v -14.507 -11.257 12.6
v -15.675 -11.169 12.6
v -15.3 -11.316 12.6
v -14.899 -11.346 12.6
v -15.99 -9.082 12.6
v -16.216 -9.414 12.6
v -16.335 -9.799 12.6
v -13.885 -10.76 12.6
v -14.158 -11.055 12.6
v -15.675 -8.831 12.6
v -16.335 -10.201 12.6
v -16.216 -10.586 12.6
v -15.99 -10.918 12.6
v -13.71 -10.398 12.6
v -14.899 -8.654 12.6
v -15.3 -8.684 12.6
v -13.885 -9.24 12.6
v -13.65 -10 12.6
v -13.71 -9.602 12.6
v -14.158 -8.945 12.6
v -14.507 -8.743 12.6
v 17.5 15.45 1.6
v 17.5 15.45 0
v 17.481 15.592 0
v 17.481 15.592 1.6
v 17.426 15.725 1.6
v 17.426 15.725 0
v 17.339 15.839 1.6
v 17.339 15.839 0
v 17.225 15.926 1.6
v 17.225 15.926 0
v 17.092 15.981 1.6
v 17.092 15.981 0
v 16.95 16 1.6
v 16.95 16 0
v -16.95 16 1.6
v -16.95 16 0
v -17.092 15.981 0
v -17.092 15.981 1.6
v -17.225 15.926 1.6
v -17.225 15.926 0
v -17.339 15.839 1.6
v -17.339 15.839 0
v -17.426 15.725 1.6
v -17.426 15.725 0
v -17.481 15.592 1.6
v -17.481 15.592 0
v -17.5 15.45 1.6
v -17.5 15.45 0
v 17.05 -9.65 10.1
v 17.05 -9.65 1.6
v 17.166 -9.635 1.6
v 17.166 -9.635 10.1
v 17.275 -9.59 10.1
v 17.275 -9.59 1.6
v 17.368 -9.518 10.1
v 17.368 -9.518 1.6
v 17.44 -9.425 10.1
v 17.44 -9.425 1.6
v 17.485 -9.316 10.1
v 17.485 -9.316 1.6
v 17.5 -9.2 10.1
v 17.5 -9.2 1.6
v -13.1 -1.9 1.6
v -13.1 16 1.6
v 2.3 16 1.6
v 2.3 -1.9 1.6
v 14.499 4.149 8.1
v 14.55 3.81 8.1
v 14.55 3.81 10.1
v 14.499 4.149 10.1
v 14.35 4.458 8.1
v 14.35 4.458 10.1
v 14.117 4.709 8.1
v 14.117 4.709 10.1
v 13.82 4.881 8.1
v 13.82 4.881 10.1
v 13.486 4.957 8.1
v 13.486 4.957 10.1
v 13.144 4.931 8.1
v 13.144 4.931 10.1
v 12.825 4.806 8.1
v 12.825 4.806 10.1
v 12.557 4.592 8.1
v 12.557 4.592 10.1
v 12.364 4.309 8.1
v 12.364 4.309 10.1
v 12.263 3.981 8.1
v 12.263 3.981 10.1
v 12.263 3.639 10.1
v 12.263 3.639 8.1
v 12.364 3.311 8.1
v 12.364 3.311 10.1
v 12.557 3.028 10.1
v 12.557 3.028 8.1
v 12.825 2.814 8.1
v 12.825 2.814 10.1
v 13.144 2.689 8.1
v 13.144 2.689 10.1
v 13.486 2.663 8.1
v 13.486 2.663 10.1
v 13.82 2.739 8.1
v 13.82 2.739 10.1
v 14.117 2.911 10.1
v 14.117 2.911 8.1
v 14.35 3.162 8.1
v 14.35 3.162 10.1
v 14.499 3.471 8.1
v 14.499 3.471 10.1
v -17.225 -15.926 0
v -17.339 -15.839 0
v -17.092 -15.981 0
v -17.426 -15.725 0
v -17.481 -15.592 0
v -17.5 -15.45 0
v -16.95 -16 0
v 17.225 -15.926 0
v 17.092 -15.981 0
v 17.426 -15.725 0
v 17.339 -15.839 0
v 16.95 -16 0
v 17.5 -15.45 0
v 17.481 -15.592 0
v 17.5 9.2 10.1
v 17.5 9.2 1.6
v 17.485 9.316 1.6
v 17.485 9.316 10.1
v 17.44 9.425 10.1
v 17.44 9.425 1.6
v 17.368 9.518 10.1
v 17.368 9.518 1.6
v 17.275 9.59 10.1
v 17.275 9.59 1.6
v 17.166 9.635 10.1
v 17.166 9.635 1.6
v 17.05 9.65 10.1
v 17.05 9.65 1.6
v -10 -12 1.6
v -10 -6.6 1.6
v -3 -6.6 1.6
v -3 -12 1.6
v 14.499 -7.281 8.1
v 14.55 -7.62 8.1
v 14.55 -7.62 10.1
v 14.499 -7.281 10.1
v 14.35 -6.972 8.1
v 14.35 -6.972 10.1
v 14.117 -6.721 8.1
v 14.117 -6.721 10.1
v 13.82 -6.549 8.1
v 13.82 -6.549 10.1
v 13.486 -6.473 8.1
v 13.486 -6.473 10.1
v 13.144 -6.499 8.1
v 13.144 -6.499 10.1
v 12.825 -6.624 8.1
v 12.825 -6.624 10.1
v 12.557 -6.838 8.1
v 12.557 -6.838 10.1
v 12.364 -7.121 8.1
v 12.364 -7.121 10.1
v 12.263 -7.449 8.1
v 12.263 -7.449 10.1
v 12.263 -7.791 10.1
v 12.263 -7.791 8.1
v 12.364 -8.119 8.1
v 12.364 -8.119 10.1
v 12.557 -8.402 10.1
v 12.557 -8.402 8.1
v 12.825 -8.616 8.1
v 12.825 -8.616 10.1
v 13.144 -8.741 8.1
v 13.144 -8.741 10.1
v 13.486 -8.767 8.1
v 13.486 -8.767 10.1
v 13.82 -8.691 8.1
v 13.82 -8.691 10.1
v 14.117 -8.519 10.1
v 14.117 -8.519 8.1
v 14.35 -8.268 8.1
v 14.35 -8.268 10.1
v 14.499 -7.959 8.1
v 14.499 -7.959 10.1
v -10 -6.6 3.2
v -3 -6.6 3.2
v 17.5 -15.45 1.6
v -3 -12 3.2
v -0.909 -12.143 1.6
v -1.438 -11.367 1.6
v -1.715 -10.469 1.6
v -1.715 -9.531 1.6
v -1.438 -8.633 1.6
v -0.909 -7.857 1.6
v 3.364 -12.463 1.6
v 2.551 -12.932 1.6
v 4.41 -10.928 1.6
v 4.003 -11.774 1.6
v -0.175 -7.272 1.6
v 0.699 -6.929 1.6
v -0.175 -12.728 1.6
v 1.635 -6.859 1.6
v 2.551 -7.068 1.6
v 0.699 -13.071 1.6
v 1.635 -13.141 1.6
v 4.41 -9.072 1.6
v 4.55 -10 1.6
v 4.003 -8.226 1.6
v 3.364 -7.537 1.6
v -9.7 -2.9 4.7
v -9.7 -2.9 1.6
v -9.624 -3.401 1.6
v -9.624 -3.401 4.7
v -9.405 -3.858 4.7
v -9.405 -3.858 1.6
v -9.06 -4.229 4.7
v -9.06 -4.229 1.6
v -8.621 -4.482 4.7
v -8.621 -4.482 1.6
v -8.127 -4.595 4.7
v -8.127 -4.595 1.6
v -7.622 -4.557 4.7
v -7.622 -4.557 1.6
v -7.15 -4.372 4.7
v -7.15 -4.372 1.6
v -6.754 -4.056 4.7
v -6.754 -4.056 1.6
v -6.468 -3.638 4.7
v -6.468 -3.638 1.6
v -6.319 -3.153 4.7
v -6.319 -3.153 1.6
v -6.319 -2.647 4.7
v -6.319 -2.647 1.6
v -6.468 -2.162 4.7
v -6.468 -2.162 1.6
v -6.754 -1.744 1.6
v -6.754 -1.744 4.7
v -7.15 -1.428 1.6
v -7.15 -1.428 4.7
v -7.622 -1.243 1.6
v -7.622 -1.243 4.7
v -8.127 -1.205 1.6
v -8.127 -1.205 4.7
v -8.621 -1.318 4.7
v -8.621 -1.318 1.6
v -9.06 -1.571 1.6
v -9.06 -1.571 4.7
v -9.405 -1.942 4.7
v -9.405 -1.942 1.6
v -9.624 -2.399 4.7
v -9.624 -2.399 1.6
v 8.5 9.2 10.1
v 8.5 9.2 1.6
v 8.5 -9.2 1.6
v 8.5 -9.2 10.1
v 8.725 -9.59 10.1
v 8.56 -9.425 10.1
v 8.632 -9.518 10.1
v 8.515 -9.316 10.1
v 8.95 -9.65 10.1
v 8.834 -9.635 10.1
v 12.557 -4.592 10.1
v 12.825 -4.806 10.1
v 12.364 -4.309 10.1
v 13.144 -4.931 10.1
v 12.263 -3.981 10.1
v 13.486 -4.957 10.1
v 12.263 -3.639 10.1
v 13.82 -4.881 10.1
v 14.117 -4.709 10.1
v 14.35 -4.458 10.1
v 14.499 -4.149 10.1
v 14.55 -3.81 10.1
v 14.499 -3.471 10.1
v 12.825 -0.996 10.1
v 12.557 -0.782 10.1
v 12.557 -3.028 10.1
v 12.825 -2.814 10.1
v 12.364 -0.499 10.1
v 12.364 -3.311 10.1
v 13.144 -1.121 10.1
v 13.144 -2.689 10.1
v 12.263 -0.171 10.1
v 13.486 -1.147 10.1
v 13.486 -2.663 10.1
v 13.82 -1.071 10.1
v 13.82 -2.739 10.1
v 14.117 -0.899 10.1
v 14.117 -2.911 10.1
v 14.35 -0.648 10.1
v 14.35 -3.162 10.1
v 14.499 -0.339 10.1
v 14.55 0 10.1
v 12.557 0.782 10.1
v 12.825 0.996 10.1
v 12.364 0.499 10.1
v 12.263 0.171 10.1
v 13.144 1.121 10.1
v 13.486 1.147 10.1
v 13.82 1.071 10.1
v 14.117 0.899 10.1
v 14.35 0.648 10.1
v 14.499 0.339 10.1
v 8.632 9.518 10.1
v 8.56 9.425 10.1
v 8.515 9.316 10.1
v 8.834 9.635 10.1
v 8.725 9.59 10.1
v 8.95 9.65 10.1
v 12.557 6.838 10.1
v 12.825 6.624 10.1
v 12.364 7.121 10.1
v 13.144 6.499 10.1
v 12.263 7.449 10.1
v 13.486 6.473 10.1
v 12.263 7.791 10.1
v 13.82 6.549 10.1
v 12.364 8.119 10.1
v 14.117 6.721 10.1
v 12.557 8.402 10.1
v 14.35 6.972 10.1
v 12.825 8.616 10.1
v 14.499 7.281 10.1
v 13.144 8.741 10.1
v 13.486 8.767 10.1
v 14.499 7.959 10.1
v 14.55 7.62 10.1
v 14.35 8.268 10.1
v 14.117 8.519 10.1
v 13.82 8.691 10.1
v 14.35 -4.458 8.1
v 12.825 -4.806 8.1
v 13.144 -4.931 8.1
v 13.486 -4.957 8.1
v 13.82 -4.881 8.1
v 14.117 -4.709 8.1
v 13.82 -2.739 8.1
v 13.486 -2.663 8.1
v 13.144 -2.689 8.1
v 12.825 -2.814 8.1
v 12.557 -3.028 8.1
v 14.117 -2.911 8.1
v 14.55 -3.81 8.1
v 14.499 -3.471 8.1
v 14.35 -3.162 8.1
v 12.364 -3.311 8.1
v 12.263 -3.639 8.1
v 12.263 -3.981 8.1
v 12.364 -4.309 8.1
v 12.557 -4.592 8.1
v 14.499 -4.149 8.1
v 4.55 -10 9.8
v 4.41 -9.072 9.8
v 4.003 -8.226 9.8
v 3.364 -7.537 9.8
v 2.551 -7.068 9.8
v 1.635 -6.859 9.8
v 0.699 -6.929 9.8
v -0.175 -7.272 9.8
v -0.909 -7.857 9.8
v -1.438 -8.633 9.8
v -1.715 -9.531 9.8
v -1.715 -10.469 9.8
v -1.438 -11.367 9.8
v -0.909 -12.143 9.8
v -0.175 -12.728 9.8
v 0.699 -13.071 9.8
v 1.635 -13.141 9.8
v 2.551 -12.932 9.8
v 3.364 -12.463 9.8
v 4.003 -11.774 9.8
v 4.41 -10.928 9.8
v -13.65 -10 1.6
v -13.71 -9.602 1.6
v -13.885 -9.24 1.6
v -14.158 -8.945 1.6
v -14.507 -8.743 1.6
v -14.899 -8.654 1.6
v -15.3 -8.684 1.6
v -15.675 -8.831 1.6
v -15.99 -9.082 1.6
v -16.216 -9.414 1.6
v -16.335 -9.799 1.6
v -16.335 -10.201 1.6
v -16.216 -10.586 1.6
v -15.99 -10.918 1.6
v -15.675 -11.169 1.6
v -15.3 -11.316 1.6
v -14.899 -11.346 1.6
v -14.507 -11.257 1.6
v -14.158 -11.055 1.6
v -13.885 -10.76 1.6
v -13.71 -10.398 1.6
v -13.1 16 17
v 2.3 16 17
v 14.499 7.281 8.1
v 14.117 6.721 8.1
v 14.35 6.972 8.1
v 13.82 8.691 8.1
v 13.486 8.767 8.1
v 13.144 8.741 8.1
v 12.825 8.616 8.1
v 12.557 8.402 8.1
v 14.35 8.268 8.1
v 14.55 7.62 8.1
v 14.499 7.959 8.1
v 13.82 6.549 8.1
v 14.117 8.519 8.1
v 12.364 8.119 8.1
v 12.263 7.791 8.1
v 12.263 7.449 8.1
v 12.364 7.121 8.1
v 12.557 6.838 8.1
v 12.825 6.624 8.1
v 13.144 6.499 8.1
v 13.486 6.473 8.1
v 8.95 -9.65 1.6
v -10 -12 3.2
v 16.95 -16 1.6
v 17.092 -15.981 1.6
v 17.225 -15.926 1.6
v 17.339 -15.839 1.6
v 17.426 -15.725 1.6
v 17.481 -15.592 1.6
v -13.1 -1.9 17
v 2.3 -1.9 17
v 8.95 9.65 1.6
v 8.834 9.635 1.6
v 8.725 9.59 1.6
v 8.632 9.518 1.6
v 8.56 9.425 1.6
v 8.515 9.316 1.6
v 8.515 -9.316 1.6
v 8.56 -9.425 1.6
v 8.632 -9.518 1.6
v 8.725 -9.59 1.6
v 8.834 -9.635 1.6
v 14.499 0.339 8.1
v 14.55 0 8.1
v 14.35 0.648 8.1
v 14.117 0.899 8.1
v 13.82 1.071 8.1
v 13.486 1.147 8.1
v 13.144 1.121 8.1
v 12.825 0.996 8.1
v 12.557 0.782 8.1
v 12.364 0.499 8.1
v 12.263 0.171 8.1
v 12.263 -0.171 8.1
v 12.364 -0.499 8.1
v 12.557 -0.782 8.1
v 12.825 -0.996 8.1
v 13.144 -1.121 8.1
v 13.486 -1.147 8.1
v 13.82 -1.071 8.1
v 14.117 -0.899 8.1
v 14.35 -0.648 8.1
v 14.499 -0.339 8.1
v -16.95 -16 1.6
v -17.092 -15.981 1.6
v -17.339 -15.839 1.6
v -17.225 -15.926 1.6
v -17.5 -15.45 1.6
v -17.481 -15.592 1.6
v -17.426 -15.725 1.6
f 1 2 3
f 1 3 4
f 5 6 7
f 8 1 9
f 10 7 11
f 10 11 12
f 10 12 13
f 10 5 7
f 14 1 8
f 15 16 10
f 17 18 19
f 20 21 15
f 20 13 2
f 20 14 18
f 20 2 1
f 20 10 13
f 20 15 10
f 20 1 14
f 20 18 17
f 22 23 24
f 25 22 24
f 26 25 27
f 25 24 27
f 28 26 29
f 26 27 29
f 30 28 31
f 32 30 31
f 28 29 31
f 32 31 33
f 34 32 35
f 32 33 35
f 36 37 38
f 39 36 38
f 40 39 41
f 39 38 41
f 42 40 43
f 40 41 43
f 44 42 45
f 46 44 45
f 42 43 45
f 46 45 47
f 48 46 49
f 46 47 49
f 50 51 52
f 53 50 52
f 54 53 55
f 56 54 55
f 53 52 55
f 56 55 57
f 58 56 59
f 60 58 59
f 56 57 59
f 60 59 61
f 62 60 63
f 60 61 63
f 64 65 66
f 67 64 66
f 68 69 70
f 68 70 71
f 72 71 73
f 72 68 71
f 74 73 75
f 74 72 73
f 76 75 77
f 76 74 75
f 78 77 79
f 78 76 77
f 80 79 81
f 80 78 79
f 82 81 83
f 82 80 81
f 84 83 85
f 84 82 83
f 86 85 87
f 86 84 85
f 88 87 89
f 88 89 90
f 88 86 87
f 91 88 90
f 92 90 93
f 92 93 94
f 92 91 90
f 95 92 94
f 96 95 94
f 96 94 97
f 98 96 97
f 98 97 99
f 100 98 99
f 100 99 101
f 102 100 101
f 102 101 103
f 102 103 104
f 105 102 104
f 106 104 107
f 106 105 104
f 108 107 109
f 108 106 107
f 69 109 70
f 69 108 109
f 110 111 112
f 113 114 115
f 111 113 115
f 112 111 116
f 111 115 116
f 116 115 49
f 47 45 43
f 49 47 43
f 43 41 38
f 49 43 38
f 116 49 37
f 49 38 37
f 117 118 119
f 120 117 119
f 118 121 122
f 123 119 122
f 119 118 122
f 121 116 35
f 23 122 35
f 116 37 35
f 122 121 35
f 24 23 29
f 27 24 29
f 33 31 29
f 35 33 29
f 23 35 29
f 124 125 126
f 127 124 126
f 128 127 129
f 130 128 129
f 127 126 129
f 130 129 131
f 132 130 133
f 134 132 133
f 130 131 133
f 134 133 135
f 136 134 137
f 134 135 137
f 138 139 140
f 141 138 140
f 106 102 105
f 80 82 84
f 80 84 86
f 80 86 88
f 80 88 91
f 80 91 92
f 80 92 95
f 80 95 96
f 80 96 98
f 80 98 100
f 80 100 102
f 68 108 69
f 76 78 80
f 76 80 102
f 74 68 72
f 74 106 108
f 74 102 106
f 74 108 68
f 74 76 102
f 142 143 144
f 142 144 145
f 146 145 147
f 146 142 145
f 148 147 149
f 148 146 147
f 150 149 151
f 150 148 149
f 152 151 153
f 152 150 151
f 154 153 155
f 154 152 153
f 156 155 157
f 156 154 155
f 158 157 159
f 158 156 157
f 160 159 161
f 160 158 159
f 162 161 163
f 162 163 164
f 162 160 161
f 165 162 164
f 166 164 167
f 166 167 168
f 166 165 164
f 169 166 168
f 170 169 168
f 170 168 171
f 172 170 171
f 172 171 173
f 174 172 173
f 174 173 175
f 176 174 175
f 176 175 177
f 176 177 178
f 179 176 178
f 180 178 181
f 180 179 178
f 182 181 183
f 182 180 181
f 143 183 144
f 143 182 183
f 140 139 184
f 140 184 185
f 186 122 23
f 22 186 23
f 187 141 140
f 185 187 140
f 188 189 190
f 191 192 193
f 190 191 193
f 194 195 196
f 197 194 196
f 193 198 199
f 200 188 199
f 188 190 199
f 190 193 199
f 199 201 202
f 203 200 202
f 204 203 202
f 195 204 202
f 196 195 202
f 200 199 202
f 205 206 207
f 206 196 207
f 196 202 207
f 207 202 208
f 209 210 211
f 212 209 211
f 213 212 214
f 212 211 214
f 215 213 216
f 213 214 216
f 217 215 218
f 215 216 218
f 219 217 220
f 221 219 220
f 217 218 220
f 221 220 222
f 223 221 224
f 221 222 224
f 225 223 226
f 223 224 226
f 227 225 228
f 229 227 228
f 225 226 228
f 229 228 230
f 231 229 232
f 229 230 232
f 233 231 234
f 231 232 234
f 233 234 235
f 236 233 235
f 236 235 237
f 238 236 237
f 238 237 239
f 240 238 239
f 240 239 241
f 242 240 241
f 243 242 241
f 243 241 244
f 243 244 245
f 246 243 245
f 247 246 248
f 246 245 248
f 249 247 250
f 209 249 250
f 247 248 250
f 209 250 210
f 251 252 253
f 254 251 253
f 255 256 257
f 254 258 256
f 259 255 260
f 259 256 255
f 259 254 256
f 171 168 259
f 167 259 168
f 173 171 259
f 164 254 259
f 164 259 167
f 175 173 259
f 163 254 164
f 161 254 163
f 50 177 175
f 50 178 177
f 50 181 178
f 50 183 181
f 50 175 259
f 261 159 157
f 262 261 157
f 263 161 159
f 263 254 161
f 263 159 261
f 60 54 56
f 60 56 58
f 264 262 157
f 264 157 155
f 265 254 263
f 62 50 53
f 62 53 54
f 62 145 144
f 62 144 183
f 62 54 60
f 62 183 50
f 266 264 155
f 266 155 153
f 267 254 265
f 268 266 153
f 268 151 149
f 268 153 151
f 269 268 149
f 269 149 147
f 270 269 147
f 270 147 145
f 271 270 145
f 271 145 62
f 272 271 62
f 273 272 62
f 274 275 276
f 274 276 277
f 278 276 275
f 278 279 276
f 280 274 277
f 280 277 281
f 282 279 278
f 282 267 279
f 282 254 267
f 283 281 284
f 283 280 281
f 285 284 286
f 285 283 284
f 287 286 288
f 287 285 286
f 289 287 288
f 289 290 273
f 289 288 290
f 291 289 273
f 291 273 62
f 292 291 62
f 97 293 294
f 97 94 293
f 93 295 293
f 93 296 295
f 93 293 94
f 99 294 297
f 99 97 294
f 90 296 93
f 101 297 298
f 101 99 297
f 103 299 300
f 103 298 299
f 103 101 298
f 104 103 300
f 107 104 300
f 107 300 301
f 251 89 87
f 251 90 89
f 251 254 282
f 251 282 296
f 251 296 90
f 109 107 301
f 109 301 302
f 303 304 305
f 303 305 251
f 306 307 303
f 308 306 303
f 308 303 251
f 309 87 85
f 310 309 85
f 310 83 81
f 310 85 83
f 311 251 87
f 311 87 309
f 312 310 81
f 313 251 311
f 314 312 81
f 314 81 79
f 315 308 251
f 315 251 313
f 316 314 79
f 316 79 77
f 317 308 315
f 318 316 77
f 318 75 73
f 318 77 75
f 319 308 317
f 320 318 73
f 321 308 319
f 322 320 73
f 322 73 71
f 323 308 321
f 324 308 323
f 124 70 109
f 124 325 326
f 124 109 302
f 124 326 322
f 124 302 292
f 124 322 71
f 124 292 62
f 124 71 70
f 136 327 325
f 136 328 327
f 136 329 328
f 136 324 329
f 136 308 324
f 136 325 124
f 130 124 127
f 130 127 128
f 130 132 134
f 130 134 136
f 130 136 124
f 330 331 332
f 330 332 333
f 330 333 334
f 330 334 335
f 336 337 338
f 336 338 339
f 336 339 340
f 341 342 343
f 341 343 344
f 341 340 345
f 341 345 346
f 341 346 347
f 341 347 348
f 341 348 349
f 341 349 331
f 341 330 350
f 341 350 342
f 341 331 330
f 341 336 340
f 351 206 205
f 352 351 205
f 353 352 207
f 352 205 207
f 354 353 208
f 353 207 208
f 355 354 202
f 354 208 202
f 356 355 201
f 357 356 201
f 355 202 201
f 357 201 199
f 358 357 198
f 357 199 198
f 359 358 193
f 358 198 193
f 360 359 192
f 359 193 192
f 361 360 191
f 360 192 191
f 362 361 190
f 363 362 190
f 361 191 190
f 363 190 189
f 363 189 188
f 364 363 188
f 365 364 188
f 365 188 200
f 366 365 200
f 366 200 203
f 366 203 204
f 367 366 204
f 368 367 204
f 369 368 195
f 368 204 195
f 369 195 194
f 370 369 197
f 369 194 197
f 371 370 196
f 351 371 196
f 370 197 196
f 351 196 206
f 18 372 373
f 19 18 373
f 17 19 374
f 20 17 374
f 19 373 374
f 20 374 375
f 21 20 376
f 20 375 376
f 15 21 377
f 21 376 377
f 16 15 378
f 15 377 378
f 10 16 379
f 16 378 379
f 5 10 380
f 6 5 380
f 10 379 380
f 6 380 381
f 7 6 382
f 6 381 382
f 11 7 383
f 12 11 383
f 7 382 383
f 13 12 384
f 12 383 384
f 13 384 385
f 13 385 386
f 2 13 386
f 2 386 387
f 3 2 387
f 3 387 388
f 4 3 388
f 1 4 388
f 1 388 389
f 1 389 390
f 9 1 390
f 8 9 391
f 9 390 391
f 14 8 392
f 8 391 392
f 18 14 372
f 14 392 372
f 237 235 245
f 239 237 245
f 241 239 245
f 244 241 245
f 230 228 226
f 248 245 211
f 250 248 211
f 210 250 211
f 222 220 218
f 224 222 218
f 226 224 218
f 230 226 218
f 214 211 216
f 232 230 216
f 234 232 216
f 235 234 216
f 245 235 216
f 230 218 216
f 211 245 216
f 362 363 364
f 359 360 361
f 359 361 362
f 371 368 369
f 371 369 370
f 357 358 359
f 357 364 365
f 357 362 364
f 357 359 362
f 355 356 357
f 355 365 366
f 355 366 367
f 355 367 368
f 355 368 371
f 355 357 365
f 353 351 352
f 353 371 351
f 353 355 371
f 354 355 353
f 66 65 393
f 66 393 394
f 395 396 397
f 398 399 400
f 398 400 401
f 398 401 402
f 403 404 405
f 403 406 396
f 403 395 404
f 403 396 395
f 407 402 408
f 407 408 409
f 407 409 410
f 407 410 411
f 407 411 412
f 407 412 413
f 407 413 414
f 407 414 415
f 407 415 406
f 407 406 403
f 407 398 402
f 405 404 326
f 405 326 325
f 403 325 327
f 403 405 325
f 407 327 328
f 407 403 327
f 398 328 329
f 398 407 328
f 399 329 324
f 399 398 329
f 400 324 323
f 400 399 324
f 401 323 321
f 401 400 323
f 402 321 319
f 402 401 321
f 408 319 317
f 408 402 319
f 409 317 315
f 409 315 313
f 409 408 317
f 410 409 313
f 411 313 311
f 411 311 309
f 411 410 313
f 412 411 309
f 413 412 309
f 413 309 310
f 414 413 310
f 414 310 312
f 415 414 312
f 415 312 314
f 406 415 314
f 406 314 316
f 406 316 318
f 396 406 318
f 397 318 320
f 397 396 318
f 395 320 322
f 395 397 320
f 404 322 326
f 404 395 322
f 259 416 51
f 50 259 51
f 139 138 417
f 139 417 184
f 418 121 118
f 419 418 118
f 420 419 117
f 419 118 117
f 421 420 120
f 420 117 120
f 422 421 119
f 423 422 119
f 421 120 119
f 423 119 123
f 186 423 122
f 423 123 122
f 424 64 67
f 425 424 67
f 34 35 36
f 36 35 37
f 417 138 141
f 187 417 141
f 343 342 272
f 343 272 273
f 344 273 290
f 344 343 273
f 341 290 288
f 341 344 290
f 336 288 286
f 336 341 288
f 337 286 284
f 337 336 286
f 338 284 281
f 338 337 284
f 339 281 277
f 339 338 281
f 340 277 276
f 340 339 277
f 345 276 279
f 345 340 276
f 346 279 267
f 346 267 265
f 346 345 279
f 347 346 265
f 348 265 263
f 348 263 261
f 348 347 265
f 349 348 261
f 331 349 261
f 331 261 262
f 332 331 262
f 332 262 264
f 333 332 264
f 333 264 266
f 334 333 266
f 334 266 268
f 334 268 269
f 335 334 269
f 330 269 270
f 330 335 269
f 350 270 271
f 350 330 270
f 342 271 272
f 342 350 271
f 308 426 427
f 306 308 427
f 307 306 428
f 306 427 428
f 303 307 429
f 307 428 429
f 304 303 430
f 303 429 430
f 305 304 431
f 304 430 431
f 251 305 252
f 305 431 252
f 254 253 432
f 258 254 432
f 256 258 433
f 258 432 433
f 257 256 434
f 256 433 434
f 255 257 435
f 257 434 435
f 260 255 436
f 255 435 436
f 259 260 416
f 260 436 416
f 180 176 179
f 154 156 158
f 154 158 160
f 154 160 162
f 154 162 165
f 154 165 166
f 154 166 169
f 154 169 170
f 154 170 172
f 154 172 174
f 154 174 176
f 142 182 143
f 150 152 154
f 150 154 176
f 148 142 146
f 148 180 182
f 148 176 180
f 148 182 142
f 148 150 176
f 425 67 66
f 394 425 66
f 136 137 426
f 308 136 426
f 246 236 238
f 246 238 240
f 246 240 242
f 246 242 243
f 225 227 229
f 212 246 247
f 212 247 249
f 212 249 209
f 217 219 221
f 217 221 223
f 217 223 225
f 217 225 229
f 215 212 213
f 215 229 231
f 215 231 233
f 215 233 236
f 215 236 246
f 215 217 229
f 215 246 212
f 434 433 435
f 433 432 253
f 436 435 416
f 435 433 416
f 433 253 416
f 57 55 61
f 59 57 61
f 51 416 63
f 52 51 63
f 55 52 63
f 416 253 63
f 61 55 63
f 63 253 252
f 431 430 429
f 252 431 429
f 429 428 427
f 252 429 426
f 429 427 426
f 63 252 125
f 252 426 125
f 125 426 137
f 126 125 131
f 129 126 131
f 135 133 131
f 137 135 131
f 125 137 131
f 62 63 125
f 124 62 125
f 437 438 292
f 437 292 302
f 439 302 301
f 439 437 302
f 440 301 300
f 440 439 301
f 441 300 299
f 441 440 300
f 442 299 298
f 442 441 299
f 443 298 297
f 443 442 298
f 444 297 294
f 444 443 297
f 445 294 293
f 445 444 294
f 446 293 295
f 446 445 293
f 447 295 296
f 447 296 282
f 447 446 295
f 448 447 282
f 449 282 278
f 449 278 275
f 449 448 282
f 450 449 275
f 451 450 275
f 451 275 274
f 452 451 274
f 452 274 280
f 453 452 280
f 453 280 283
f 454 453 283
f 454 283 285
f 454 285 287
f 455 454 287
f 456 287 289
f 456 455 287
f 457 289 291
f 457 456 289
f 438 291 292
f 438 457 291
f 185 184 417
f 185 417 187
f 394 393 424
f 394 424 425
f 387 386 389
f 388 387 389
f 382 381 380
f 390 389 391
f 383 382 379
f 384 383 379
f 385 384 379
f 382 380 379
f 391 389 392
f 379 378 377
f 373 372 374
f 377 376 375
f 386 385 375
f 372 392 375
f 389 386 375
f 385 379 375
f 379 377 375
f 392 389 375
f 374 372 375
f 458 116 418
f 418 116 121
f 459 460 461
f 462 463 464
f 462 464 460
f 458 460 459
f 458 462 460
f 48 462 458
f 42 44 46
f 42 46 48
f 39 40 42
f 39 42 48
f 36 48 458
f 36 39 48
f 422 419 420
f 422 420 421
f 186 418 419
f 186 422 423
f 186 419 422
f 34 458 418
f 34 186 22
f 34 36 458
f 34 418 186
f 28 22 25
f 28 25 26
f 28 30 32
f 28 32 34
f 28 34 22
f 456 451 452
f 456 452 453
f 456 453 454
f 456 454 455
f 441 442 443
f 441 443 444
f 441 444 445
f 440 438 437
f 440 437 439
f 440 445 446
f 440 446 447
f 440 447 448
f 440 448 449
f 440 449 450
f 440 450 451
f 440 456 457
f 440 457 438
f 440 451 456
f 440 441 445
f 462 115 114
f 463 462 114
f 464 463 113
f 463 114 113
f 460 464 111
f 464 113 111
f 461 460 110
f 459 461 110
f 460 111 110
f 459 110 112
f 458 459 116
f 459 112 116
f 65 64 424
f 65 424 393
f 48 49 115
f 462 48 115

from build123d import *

# Parameters (mm, degrees)
PCB_35X32_DEPTH                   = 1.6
RELAY_24V_START                   = 1.6
RELAY_24V_SKETCH_W                = 15.4
RELAY_24V_SKETCH_H                = 17.9
RELAY_24V_DEPTH                   = 15.4
FIVE_POSITION_3P81_TERMINAL_START = 1.6
FIVE_POSITION_3P81_TERMINAL_DEPTH = 8.5
FIVE_TERMINAL_RECESSES_START      = 8.1
FIVE_TERMINAL_RECESSES_SKETCH_R   = 1.15
FIVE_TERMINAL_RECESSES_DEPTH      = 2
RECEIVER_CAPACITOR_START          = 1.6
RECEIVER_CAPACITOR_SKETCH_R       = 3.15
RECEIVER_CAPACITOR_DEPTH          = 8.2
RF_COIL_ENVELOPE_START            = 1.6
RF_COIL_ENVELOPE_SKETCH_R         = 1.35
RF_COIL_ENVELOPE_DEPTH            = 11
RECEIVER_IC_START                 = 1.6
RECEIVER_IC_SKETCH_W              = 7
RECEIVER_IC_SKETCH_H              = 5.4
RECEIVER_IC_DEPTH                 = 1.6
LEARN_BUTTON_START                = 1.6
LEARN_BUTTON_SKETCH_R             = 1.7
LEARN_BUTTON_DEPTH                = 3.1


with BuildPart() as part:
    # PCB_35x32_Sketch → PCB_35x32 (new body)
    with BuildSketch(Plane.XY):
        with BuildLine():
            Line((-16.95, -16), (16.95, -16))
            ThreePointArc((16.95, -16), (17.33890873, -15.83890873), (17.5, -15.45))
            Line((17.5, -15.45), (17.5, 15.45))
            ThreePointArc((17.5, 15.45), (17.33890873, 15.83890873), (16.95, 16))
            Line((16.95, 16), (-16.95, 16))
            ThreePointArc((-16.95, 16), (-17.33890873, 15.83890873), (-17.5, 15.45))
            Line((-17.5, 15.45), (-17.5, -15.45))
            ThreePointArc((-17.5, -15.45), (-17.33890873, -15.83890873), (-16.95, -16))
        make_face()
    extrude(amount=PCB_35X32_DEPTH)


with BuildPart() as body_2:
    # Relay_24V_Sketch → Relay_24V (new body)
    with BuildSketch(Plane.XY.offset(RELAY_24V_START)):
        with Locations((-5.4, 7.05)):
            Rectangle(RELAY_24V_SKETCH_W, RELAY_24V_SKETCH_H)
    extrude(amount=RELAY_24V_DEPTH)


with BuildPart() as body_3:
    # Five_position_3p81_terminal_Sketch → Five_position_3p81_terminal (new body)
    with BuildSketch(Plane.XY.offset(FIVE_POSITION_3P81_TERMINAL_START)):
        with BuildLine():
            Line((8.95, -9.65), (17.05, -9.65))
            ThreePointArc((17.05, -9.65), (17.368198052, -9.518198052), (17.5, -9.2))
            Line((17.5, -9.2), (17.5, 9.2))
            ThreePointArc((17.5, 9.2), (17.368198052, 9.518198052), (17.05, 9.65))
            Line((17.05, 9.65), (8.95, 9.65))
            ThreePointArc((8.95, 9.65), (8.631801948, 9.518198052), (8.5, 9.2))
            Line((8.5, 9.2), (8.5, -9.2))
            ThreePointArc((8.5, -9.2), (8.631801948, -9.518198052), (8.95, -9.65))
        make_face()
    extrude(amount=FIVE_POSITION_3P81_TERMINAL_DEPTH)

    # Five_terminal_recesses_Sketch → Five_terminal_recesses (cut)
    with BuildSketch(Plane.XY.offset(FIVE_TERMINAL_RECESSES_START)):
        with Locations((13.4, -7.62)):
            Circle(FIVE_TERMINAL_RECESSES_SKETCH_R)
        with Locations((13.4, -3.81)):
            Circle(FIVE_TERMINAL_RECESSES_SKETCH_R)
        with Locations((13.4, 0)):
            Circle(FIVE_TERMINAL_RECESSES_SKETCH_R)
        with Locations((13.4, 3.81)):
            Circle(FIVE_TERMINAL_RECESSES_SKETCH_R)
        with Locations((13.4, 7.62)):
            Circle(FIVE_TERMINAL_RECESSES_SKETCH_R)
    extrude(amount=FIVE_TERMINAL_RECESSES_DEPTH, mode=Mode.SUBTRACT)


with BuildPart() as body_4:
    # Receiver_capacitor_Sketch → Receiver_capacitor (new body)
    with BuildSketch(Plane.XY.offset(RECEIVER_CAPACITOR_START)):
        with Locations((1.4, -10)):
            Circle(RECEIVER_CAPACITOR_SKETCH_R)
    extrude(amount=RECEIVER_CAPACITOR_DEPTH)


with BuildPart() as body_5:
    # RF_coil_envelope_Sketch → RF_coil_envelope (new body)
    with BuildSketch(Plane.XY.offset(RF_COIL_ENVELOPE_START)):
        with Locations((-15, -10)):
            Circle(RF_COIL_ENVELOPE_SKETCH_R)
    extrude(amount=RF_COIL_ENVELOPE_DEPTH)


with BuildPart() as body_6:
    # Receiver_IC_Sketch → Receiver_IC (new body)
    with BuildSketch(Plane.XY.offset(RECEIVER_IC_START)):
        with Locations((-6.5, -9.3)):
            Rectangle(RECEIVER_IC_SKETCH_W, RECEIVER_IC_SKETCH_H)
    extrude(amount=RECEIVER_IC_DEPTH)


with BuildPart() as body_7:
    # Learn_button_Sketch → Learn_button (new body)
    with BuildSketch(Plane.XY.offset(LEARN_BUTTON_START)):
        with Locations((-8, -2.9)):
            Circle(LEARN_BUTTON_SKETCH_R)
    extrude(amount=LEARN_BUTTON_DEPTH)


solid = Compound([part.part, body_2.part, body_3.part, body_4.part, body_5.part, body_6.part, body_7.part])
